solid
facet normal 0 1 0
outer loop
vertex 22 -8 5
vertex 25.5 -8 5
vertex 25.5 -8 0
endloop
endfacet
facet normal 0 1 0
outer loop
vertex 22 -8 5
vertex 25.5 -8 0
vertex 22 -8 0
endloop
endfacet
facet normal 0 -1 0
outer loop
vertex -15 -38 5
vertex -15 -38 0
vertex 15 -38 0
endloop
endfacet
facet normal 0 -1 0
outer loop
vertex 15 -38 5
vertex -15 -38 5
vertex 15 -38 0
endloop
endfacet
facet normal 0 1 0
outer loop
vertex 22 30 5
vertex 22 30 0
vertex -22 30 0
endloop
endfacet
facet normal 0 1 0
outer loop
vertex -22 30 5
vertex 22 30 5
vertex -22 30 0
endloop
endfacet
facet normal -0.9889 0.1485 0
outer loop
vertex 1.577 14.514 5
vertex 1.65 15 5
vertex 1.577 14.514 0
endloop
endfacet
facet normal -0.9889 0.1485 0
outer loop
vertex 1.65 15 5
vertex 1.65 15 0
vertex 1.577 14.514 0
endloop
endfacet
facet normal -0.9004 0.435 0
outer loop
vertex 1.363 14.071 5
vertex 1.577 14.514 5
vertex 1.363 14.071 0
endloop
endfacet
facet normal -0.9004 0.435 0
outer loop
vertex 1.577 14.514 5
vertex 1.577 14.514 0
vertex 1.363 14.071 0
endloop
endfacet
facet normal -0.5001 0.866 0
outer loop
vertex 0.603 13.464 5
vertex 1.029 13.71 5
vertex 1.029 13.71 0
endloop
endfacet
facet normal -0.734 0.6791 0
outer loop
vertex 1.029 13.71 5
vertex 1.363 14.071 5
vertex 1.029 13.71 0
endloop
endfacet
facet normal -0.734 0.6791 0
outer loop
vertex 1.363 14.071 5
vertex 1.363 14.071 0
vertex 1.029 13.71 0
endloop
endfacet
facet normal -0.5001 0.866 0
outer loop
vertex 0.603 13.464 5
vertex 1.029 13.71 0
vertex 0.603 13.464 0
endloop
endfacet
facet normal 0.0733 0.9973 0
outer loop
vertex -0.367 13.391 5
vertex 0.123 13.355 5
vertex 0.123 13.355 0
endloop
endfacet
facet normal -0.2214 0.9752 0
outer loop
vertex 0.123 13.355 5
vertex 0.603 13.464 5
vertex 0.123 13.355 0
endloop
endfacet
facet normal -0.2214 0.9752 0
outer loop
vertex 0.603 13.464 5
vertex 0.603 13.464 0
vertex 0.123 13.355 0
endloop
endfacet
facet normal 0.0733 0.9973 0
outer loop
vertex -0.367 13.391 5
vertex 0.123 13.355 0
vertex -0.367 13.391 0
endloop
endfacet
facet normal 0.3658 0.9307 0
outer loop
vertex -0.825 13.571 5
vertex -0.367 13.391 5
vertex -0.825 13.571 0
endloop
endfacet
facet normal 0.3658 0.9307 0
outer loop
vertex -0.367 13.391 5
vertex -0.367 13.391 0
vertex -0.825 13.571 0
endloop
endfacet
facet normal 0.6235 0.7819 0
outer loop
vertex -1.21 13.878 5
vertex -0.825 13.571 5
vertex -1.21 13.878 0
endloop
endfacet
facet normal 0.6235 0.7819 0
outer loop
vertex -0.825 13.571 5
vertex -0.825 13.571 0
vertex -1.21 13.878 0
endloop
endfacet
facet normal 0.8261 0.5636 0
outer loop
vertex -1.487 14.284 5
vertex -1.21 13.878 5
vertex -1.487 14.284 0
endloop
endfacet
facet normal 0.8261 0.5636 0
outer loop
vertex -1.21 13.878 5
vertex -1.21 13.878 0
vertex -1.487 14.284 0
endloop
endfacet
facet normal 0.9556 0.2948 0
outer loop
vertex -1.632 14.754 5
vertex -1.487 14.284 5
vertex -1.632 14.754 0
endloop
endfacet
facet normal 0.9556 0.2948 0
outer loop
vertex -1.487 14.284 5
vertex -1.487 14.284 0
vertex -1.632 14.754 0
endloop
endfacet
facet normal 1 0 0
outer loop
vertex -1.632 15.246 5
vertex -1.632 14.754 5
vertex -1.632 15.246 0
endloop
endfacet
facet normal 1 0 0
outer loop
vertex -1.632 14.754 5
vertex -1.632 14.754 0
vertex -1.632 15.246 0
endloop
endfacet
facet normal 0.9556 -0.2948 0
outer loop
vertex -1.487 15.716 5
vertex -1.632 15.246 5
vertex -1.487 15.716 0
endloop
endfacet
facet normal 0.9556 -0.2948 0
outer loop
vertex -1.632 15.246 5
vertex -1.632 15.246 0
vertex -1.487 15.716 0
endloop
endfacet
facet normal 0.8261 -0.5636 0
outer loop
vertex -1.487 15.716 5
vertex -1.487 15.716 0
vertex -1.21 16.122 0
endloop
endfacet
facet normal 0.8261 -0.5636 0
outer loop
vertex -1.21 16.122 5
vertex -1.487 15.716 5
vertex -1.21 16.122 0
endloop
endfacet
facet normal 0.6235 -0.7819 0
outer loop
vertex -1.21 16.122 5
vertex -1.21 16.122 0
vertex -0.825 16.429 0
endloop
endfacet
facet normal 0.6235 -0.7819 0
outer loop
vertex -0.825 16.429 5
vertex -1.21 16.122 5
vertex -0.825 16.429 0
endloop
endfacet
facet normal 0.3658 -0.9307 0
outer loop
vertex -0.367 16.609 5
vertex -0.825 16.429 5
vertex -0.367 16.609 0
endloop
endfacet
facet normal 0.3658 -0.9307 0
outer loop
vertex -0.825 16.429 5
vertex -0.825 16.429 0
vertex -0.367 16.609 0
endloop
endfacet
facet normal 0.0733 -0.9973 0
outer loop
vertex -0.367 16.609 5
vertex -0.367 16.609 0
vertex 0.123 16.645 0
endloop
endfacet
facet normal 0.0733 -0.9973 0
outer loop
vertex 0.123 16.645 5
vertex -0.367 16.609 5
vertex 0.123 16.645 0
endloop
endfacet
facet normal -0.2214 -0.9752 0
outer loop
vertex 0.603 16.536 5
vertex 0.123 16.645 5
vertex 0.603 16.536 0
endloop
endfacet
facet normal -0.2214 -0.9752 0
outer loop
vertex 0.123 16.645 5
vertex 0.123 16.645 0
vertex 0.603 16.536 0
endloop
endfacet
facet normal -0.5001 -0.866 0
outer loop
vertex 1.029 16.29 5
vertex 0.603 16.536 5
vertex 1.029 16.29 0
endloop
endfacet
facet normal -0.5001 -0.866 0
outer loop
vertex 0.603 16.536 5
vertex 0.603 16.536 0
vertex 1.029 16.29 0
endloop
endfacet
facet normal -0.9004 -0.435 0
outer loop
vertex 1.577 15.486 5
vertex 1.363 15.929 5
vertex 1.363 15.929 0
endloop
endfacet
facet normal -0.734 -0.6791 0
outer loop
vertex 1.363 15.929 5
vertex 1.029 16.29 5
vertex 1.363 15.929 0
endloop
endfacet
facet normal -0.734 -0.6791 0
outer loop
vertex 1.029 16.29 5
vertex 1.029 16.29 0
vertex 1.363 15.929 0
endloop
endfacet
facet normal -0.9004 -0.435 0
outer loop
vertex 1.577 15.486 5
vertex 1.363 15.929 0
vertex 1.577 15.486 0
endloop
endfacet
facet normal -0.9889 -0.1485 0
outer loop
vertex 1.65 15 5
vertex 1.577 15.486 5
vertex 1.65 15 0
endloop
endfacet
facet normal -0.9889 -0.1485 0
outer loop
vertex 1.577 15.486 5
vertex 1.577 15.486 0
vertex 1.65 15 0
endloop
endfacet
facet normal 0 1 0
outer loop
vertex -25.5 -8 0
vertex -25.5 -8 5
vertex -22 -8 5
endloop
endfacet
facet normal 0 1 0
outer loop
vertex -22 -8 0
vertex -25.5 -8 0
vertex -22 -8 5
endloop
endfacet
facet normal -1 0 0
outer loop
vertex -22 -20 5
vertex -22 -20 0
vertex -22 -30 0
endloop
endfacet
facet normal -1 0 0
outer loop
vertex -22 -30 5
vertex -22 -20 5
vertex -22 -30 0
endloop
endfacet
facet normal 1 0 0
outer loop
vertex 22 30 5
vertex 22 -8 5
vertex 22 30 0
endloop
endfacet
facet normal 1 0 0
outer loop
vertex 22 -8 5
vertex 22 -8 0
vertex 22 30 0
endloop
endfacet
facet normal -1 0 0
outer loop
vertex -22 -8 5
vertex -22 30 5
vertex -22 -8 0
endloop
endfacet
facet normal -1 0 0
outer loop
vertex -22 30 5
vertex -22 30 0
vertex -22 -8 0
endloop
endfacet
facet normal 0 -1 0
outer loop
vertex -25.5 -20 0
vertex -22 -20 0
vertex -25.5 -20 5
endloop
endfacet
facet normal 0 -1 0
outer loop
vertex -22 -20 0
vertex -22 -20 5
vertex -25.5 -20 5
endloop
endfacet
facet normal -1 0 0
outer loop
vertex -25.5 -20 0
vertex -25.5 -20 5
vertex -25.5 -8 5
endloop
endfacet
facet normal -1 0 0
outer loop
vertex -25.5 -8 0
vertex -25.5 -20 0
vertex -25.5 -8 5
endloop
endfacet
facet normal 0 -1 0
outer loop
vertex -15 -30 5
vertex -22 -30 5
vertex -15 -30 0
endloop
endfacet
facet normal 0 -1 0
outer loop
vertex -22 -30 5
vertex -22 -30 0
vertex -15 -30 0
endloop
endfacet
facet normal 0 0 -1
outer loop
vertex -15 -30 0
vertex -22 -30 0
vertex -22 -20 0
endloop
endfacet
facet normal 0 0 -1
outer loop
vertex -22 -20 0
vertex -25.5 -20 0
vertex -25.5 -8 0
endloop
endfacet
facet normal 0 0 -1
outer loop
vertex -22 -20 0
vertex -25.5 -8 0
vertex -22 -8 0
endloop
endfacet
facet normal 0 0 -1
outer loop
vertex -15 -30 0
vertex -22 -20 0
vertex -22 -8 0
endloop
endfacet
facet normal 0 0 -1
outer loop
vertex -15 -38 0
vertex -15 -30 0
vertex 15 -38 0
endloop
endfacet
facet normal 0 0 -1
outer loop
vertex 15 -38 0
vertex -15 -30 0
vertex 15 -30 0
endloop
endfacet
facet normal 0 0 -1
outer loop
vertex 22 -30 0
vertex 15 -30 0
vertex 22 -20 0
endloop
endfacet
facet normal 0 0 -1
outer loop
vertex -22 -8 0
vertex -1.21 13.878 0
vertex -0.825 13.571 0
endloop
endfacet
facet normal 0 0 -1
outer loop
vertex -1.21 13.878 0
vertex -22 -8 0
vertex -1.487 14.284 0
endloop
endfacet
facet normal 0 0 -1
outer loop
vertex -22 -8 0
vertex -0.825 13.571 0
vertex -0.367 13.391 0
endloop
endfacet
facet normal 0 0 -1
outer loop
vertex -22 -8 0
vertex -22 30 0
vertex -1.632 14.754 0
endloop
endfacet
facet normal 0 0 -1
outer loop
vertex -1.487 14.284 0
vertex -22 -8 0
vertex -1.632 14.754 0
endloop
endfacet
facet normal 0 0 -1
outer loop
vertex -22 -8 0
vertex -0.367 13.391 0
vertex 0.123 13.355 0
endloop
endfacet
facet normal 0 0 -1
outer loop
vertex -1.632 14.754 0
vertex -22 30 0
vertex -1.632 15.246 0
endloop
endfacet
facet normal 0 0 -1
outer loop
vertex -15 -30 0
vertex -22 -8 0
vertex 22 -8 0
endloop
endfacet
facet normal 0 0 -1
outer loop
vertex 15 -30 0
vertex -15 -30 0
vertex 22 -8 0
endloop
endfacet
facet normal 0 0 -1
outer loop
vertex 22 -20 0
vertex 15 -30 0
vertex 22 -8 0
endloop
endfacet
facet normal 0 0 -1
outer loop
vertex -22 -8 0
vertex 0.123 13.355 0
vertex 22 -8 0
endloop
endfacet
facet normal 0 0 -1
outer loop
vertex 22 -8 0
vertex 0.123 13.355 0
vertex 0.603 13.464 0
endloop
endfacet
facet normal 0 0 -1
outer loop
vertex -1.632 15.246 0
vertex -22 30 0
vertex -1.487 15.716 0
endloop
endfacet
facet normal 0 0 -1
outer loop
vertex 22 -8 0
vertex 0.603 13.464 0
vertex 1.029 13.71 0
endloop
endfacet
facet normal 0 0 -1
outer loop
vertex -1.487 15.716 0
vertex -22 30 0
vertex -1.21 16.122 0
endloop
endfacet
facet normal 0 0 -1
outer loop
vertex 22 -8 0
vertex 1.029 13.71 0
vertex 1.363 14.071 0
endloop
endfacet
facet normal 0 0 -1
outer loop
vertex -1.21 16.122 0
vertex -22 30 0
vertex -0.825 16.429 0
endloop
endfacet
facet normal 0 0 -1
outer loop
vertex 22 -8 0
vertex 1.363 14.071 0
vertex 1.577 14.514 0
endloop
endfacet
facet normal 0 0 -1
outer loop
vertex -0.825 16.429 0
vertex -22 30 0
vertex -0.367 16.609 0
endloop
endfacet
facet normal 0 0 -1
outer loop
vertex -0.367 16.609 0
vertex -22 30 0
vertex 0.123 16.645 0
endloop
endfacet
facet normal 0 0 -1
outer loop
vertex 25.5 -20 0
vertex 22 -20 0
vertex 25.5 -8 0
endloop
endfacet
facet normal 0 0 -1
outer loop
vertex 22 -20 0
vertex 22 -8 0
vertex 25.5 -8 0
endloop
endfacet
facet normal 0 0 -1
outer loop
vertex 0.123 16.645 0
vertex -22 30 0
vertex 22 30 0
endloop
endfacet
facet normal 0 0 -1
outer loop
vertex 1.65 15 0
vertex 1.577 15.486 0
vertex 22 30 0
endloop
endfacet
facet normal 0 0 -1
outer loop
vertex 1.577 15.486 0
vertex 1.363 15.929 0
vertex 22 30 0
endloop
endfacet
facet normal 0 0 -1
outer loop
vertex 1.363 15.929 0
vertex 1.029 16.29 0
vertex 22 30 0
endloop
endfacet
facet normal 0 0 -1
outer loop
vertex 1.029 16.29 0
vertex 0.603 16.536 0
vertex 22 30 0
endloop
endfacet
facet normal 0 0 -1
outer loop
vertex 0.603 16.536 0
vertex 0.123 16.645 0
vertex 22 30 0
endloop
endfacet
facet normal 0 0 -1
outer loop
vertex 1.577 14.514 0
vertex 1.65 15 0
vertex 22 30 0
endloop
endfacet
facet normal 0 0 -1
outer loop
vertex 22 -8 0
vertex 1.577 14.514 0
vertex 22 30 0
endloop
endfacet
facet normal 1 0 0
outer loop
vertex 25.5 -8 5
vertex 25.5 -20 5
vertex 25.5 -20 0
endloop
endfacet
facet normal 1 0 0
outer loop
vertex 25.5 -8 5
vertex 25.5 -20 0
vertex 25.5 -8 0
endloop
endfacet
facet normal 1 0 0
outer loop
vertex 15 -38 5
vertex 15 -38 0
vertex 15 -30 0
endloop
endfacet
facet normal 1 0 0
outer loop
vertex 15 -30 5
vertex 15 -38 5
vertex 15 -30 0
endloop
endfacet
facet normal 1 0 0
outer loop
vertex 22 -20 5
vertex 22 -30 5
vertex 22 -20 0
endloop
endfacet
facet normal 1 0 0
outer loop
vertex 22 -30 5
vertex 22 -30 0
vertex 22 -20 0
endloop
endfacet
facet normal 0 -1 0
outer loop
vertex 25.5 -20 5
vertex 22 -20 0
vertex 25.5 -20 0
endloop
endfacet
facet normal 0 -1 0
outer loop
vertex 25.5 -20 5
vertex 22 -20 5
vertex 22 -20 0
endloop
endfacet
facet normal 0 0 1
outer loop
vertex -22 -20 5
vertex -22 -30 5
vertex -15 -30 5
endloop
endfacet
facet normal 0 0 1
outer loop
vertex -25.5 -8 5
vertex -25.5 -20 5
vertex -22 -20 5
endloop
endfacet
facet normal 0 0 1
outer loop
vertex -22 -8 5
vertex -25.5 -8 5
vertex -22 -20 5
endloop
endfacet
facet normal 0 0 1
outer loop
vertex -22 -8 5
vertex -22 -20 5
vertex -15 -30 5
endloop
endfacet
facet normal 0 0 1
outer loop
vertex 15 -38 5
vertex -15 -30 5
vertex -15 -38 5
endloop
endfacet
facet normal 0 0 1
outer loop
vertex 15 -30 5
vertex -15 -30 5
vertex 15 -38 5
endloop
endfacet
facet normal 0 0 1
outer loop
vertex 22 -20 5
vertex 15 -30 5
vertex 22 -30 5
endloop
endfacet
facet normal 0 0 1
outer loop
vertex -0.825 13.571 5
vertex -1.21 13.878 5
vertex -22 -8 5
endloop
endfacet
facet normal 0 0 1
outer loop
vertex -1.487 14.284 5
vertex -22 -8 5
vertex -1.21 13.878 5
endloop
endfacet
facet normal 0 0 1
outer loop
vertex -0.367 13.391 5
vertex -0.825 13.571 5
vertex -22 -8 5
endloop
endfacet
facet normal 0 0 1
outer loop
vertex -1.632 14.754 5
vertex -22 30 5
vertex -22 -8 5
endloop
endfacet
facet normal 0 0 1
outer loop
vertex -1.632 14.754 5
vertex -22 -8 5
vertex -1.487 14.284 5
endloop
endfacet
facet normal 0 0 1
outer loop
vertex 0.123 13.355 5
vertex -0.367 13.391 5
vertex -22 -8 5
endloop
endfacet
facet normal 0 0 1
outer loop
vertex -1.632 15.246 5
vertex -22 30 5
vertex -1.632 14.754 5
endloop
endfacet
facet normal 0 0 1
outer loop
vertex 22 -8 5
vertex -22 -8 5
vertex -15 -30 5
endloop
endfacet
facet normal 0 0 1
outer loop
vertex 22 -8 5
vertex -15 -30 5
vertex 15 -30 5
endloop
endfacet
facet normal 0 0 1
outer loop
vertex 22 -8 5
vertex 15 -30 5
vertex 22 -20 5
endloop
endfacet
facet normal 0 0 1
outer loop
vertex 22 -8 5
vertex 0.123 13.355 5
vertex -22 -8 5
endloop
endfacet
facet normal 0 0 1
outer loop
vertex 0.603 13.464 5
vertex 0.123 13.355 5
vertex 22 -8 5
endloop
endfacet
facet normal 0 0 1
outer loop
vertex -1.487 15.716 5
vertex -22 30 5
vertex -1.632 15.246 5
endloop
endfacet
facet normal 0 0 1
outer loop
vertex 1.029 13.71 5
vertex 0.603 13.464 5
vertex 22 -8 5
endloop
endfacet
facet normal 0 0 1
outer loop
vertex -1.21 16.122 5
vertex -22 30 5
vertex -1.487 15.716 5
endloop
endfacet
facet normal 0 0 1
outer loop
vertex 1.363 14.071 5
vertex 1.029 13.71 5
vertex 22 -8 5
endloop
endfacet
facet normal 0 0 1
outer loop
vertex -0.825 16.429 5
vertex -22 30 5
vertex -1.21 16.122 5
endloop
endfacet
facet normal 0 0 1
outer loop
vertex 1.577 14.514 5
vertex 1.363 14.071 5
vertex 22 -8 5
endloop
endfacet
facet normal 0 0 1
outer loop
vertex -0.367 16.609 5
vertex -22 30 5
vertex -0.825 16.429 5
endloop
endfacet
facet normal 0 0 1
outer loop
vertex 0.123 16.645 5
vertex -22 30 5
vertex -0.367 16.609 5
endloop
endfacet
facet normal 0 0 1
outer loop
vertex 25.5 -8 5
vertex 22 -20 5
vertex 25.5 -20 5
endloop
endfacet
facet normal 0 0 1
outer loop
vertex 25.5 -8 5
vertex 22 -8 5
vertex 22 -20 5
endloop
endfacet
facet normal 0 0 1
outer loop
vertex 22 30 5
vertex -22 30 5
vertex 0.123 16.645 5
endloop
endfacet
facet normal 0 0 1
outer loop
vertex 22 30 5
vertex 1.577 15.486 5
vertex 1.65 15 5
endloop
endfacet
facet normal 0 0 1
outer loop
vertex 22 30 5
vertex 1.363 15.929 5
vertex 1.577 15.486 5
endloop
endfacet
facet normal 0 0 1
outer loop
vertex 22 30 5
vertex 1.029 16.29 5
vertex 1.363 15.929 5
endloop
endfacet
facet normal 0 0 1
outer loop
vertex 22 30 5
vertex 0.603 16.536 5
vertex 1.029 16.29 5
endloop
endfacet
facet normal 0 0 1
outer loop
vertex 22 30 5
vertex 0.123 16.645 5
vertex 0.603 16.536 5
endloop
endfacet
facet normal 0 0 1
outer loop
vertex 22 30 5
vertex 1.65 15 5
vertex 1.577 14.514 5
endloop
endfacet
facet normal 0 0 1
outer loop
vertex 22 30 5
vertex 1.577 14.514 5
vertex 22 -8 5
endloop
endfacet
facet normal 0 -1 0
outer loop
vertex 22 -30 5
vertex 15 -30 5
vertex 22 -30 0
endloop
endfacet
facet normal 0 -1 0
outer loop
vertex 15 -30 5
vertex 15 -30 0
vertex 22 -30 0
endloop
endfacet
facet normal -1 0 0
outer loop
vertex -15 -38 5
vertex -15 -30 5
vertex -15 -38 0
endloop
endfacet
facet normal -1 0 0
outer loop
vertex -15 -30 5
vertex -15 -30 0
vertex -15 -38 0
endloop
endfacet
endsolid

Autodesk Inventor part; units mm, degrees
ref_plane "YZ Plane" through (0, 0, 0) normal (1, 0, 0) x (0, 1, 0)
ref_plane "XZ Plane" through (0, 0, 0) normal (0, 1, 0) x (-1, 0, 0)
ref_plane "XY Plane" through (0, 0, 0) normal (0, 0, 1) x (1, 0, 0)
sketch "Sketch1" plane through (0, 0, 0) normal (0, 0, 1) x (1, 0, 0)
  line L0 (-22, -30) -> (22, -30)
  line L1 (22, -30) -> (22, 30)
  line L2 (22, 30) -> (-22, 30)
  line L3 (-22, 30) -> (-22, -30)
  line L4 (-22, -30) -> (22, 30) construction
  line L5 (22, -30) -> (-22, 30) construction
  line L6 (-15, -38) -> (15, -38)
  line L7 (15, -38) -> (15, -30)
  line L8 (15, -30) -> (-15, -30)
  line L9 (-15, -30) -> (-15, -38)
  line L10 (-15, -38) -> (15, -30) construction
  line L11 (15, -38) -> (-15, -30) construction
  circle A0 centre (0, 15) radius 1.65
  point P0 (0, 0)
  point P1 (0, -34)
  point P2 (0, -30)
  point P3 (0, 30)
  dimension "d0" = 44
  dimension "d1" = 60
  dimension "d2" = 30
  dimension "d3" = 8
  dimension "d4" = 3.3
  dimension "d5" = 15
sketch "Sketch2" plane through (0, 0, 5) normal (0, 0, 1) x (1, 0, 0)
  line L0 (22, -30) -> (22, 30)
  line L1 (22, -20) -> (25.5, -20)
  line L2 (25.5, -20) -> (25.5, -8)
  line L3 (25.5, -8) -> (22, -8)
  line L4 (22, -8) -> (22, -20)
  line L5 (22, -30) -> (15, -30)
  line L6 (0, 0) -> (0, -38)
  line L7 (-15, -38) -> (15, -38)
  line L8 (-22, -20) -> (-25.5, -20)
  line L9 (-25.5, -20) -> (-25.5, -8)
  line L10 (-25.5, -8) -> (-22, -8)
  line L11 (-22, -8) -> (-22, -20)
  dimension "d7" = 3.5
  dimension "d8" = 12
  dimension "d9" = 10
extrude "Plate1" add sketch "Sketch1" along normal blind 5
sheet face with bend "Face2" sketch "Sketch2" thickness 5 toward (0, 0, -1) bend radius 5
bend "Bend1"
equation "\"d6\" = Thickness"
equation "\"d10\" = BendRadius"
equation "\"d11\" = BendReliefWidth"
equation "\"d13\" = MinimumRemnant"
equation "\"d12\" = BendReliefDepth"
equation "\"d14\" = TransitionRadius"
equation "\"BendRadius\" = Thickness"
equation "\"BendReliefWidth\" = Thickness"
equation "\"BendReliefDepth\" = 0.5 * Thickness"
equation "\"TransitionRadius\" = BendRadius"
equation "\"JacobiRadiusSize\" = BendRadius"
equation "\"GapSize\" = Thickness"
equation "\"Thickness\" = 5"
equation "\"MinimumRemnant\" = 10"
properties part number "Path Back End"
